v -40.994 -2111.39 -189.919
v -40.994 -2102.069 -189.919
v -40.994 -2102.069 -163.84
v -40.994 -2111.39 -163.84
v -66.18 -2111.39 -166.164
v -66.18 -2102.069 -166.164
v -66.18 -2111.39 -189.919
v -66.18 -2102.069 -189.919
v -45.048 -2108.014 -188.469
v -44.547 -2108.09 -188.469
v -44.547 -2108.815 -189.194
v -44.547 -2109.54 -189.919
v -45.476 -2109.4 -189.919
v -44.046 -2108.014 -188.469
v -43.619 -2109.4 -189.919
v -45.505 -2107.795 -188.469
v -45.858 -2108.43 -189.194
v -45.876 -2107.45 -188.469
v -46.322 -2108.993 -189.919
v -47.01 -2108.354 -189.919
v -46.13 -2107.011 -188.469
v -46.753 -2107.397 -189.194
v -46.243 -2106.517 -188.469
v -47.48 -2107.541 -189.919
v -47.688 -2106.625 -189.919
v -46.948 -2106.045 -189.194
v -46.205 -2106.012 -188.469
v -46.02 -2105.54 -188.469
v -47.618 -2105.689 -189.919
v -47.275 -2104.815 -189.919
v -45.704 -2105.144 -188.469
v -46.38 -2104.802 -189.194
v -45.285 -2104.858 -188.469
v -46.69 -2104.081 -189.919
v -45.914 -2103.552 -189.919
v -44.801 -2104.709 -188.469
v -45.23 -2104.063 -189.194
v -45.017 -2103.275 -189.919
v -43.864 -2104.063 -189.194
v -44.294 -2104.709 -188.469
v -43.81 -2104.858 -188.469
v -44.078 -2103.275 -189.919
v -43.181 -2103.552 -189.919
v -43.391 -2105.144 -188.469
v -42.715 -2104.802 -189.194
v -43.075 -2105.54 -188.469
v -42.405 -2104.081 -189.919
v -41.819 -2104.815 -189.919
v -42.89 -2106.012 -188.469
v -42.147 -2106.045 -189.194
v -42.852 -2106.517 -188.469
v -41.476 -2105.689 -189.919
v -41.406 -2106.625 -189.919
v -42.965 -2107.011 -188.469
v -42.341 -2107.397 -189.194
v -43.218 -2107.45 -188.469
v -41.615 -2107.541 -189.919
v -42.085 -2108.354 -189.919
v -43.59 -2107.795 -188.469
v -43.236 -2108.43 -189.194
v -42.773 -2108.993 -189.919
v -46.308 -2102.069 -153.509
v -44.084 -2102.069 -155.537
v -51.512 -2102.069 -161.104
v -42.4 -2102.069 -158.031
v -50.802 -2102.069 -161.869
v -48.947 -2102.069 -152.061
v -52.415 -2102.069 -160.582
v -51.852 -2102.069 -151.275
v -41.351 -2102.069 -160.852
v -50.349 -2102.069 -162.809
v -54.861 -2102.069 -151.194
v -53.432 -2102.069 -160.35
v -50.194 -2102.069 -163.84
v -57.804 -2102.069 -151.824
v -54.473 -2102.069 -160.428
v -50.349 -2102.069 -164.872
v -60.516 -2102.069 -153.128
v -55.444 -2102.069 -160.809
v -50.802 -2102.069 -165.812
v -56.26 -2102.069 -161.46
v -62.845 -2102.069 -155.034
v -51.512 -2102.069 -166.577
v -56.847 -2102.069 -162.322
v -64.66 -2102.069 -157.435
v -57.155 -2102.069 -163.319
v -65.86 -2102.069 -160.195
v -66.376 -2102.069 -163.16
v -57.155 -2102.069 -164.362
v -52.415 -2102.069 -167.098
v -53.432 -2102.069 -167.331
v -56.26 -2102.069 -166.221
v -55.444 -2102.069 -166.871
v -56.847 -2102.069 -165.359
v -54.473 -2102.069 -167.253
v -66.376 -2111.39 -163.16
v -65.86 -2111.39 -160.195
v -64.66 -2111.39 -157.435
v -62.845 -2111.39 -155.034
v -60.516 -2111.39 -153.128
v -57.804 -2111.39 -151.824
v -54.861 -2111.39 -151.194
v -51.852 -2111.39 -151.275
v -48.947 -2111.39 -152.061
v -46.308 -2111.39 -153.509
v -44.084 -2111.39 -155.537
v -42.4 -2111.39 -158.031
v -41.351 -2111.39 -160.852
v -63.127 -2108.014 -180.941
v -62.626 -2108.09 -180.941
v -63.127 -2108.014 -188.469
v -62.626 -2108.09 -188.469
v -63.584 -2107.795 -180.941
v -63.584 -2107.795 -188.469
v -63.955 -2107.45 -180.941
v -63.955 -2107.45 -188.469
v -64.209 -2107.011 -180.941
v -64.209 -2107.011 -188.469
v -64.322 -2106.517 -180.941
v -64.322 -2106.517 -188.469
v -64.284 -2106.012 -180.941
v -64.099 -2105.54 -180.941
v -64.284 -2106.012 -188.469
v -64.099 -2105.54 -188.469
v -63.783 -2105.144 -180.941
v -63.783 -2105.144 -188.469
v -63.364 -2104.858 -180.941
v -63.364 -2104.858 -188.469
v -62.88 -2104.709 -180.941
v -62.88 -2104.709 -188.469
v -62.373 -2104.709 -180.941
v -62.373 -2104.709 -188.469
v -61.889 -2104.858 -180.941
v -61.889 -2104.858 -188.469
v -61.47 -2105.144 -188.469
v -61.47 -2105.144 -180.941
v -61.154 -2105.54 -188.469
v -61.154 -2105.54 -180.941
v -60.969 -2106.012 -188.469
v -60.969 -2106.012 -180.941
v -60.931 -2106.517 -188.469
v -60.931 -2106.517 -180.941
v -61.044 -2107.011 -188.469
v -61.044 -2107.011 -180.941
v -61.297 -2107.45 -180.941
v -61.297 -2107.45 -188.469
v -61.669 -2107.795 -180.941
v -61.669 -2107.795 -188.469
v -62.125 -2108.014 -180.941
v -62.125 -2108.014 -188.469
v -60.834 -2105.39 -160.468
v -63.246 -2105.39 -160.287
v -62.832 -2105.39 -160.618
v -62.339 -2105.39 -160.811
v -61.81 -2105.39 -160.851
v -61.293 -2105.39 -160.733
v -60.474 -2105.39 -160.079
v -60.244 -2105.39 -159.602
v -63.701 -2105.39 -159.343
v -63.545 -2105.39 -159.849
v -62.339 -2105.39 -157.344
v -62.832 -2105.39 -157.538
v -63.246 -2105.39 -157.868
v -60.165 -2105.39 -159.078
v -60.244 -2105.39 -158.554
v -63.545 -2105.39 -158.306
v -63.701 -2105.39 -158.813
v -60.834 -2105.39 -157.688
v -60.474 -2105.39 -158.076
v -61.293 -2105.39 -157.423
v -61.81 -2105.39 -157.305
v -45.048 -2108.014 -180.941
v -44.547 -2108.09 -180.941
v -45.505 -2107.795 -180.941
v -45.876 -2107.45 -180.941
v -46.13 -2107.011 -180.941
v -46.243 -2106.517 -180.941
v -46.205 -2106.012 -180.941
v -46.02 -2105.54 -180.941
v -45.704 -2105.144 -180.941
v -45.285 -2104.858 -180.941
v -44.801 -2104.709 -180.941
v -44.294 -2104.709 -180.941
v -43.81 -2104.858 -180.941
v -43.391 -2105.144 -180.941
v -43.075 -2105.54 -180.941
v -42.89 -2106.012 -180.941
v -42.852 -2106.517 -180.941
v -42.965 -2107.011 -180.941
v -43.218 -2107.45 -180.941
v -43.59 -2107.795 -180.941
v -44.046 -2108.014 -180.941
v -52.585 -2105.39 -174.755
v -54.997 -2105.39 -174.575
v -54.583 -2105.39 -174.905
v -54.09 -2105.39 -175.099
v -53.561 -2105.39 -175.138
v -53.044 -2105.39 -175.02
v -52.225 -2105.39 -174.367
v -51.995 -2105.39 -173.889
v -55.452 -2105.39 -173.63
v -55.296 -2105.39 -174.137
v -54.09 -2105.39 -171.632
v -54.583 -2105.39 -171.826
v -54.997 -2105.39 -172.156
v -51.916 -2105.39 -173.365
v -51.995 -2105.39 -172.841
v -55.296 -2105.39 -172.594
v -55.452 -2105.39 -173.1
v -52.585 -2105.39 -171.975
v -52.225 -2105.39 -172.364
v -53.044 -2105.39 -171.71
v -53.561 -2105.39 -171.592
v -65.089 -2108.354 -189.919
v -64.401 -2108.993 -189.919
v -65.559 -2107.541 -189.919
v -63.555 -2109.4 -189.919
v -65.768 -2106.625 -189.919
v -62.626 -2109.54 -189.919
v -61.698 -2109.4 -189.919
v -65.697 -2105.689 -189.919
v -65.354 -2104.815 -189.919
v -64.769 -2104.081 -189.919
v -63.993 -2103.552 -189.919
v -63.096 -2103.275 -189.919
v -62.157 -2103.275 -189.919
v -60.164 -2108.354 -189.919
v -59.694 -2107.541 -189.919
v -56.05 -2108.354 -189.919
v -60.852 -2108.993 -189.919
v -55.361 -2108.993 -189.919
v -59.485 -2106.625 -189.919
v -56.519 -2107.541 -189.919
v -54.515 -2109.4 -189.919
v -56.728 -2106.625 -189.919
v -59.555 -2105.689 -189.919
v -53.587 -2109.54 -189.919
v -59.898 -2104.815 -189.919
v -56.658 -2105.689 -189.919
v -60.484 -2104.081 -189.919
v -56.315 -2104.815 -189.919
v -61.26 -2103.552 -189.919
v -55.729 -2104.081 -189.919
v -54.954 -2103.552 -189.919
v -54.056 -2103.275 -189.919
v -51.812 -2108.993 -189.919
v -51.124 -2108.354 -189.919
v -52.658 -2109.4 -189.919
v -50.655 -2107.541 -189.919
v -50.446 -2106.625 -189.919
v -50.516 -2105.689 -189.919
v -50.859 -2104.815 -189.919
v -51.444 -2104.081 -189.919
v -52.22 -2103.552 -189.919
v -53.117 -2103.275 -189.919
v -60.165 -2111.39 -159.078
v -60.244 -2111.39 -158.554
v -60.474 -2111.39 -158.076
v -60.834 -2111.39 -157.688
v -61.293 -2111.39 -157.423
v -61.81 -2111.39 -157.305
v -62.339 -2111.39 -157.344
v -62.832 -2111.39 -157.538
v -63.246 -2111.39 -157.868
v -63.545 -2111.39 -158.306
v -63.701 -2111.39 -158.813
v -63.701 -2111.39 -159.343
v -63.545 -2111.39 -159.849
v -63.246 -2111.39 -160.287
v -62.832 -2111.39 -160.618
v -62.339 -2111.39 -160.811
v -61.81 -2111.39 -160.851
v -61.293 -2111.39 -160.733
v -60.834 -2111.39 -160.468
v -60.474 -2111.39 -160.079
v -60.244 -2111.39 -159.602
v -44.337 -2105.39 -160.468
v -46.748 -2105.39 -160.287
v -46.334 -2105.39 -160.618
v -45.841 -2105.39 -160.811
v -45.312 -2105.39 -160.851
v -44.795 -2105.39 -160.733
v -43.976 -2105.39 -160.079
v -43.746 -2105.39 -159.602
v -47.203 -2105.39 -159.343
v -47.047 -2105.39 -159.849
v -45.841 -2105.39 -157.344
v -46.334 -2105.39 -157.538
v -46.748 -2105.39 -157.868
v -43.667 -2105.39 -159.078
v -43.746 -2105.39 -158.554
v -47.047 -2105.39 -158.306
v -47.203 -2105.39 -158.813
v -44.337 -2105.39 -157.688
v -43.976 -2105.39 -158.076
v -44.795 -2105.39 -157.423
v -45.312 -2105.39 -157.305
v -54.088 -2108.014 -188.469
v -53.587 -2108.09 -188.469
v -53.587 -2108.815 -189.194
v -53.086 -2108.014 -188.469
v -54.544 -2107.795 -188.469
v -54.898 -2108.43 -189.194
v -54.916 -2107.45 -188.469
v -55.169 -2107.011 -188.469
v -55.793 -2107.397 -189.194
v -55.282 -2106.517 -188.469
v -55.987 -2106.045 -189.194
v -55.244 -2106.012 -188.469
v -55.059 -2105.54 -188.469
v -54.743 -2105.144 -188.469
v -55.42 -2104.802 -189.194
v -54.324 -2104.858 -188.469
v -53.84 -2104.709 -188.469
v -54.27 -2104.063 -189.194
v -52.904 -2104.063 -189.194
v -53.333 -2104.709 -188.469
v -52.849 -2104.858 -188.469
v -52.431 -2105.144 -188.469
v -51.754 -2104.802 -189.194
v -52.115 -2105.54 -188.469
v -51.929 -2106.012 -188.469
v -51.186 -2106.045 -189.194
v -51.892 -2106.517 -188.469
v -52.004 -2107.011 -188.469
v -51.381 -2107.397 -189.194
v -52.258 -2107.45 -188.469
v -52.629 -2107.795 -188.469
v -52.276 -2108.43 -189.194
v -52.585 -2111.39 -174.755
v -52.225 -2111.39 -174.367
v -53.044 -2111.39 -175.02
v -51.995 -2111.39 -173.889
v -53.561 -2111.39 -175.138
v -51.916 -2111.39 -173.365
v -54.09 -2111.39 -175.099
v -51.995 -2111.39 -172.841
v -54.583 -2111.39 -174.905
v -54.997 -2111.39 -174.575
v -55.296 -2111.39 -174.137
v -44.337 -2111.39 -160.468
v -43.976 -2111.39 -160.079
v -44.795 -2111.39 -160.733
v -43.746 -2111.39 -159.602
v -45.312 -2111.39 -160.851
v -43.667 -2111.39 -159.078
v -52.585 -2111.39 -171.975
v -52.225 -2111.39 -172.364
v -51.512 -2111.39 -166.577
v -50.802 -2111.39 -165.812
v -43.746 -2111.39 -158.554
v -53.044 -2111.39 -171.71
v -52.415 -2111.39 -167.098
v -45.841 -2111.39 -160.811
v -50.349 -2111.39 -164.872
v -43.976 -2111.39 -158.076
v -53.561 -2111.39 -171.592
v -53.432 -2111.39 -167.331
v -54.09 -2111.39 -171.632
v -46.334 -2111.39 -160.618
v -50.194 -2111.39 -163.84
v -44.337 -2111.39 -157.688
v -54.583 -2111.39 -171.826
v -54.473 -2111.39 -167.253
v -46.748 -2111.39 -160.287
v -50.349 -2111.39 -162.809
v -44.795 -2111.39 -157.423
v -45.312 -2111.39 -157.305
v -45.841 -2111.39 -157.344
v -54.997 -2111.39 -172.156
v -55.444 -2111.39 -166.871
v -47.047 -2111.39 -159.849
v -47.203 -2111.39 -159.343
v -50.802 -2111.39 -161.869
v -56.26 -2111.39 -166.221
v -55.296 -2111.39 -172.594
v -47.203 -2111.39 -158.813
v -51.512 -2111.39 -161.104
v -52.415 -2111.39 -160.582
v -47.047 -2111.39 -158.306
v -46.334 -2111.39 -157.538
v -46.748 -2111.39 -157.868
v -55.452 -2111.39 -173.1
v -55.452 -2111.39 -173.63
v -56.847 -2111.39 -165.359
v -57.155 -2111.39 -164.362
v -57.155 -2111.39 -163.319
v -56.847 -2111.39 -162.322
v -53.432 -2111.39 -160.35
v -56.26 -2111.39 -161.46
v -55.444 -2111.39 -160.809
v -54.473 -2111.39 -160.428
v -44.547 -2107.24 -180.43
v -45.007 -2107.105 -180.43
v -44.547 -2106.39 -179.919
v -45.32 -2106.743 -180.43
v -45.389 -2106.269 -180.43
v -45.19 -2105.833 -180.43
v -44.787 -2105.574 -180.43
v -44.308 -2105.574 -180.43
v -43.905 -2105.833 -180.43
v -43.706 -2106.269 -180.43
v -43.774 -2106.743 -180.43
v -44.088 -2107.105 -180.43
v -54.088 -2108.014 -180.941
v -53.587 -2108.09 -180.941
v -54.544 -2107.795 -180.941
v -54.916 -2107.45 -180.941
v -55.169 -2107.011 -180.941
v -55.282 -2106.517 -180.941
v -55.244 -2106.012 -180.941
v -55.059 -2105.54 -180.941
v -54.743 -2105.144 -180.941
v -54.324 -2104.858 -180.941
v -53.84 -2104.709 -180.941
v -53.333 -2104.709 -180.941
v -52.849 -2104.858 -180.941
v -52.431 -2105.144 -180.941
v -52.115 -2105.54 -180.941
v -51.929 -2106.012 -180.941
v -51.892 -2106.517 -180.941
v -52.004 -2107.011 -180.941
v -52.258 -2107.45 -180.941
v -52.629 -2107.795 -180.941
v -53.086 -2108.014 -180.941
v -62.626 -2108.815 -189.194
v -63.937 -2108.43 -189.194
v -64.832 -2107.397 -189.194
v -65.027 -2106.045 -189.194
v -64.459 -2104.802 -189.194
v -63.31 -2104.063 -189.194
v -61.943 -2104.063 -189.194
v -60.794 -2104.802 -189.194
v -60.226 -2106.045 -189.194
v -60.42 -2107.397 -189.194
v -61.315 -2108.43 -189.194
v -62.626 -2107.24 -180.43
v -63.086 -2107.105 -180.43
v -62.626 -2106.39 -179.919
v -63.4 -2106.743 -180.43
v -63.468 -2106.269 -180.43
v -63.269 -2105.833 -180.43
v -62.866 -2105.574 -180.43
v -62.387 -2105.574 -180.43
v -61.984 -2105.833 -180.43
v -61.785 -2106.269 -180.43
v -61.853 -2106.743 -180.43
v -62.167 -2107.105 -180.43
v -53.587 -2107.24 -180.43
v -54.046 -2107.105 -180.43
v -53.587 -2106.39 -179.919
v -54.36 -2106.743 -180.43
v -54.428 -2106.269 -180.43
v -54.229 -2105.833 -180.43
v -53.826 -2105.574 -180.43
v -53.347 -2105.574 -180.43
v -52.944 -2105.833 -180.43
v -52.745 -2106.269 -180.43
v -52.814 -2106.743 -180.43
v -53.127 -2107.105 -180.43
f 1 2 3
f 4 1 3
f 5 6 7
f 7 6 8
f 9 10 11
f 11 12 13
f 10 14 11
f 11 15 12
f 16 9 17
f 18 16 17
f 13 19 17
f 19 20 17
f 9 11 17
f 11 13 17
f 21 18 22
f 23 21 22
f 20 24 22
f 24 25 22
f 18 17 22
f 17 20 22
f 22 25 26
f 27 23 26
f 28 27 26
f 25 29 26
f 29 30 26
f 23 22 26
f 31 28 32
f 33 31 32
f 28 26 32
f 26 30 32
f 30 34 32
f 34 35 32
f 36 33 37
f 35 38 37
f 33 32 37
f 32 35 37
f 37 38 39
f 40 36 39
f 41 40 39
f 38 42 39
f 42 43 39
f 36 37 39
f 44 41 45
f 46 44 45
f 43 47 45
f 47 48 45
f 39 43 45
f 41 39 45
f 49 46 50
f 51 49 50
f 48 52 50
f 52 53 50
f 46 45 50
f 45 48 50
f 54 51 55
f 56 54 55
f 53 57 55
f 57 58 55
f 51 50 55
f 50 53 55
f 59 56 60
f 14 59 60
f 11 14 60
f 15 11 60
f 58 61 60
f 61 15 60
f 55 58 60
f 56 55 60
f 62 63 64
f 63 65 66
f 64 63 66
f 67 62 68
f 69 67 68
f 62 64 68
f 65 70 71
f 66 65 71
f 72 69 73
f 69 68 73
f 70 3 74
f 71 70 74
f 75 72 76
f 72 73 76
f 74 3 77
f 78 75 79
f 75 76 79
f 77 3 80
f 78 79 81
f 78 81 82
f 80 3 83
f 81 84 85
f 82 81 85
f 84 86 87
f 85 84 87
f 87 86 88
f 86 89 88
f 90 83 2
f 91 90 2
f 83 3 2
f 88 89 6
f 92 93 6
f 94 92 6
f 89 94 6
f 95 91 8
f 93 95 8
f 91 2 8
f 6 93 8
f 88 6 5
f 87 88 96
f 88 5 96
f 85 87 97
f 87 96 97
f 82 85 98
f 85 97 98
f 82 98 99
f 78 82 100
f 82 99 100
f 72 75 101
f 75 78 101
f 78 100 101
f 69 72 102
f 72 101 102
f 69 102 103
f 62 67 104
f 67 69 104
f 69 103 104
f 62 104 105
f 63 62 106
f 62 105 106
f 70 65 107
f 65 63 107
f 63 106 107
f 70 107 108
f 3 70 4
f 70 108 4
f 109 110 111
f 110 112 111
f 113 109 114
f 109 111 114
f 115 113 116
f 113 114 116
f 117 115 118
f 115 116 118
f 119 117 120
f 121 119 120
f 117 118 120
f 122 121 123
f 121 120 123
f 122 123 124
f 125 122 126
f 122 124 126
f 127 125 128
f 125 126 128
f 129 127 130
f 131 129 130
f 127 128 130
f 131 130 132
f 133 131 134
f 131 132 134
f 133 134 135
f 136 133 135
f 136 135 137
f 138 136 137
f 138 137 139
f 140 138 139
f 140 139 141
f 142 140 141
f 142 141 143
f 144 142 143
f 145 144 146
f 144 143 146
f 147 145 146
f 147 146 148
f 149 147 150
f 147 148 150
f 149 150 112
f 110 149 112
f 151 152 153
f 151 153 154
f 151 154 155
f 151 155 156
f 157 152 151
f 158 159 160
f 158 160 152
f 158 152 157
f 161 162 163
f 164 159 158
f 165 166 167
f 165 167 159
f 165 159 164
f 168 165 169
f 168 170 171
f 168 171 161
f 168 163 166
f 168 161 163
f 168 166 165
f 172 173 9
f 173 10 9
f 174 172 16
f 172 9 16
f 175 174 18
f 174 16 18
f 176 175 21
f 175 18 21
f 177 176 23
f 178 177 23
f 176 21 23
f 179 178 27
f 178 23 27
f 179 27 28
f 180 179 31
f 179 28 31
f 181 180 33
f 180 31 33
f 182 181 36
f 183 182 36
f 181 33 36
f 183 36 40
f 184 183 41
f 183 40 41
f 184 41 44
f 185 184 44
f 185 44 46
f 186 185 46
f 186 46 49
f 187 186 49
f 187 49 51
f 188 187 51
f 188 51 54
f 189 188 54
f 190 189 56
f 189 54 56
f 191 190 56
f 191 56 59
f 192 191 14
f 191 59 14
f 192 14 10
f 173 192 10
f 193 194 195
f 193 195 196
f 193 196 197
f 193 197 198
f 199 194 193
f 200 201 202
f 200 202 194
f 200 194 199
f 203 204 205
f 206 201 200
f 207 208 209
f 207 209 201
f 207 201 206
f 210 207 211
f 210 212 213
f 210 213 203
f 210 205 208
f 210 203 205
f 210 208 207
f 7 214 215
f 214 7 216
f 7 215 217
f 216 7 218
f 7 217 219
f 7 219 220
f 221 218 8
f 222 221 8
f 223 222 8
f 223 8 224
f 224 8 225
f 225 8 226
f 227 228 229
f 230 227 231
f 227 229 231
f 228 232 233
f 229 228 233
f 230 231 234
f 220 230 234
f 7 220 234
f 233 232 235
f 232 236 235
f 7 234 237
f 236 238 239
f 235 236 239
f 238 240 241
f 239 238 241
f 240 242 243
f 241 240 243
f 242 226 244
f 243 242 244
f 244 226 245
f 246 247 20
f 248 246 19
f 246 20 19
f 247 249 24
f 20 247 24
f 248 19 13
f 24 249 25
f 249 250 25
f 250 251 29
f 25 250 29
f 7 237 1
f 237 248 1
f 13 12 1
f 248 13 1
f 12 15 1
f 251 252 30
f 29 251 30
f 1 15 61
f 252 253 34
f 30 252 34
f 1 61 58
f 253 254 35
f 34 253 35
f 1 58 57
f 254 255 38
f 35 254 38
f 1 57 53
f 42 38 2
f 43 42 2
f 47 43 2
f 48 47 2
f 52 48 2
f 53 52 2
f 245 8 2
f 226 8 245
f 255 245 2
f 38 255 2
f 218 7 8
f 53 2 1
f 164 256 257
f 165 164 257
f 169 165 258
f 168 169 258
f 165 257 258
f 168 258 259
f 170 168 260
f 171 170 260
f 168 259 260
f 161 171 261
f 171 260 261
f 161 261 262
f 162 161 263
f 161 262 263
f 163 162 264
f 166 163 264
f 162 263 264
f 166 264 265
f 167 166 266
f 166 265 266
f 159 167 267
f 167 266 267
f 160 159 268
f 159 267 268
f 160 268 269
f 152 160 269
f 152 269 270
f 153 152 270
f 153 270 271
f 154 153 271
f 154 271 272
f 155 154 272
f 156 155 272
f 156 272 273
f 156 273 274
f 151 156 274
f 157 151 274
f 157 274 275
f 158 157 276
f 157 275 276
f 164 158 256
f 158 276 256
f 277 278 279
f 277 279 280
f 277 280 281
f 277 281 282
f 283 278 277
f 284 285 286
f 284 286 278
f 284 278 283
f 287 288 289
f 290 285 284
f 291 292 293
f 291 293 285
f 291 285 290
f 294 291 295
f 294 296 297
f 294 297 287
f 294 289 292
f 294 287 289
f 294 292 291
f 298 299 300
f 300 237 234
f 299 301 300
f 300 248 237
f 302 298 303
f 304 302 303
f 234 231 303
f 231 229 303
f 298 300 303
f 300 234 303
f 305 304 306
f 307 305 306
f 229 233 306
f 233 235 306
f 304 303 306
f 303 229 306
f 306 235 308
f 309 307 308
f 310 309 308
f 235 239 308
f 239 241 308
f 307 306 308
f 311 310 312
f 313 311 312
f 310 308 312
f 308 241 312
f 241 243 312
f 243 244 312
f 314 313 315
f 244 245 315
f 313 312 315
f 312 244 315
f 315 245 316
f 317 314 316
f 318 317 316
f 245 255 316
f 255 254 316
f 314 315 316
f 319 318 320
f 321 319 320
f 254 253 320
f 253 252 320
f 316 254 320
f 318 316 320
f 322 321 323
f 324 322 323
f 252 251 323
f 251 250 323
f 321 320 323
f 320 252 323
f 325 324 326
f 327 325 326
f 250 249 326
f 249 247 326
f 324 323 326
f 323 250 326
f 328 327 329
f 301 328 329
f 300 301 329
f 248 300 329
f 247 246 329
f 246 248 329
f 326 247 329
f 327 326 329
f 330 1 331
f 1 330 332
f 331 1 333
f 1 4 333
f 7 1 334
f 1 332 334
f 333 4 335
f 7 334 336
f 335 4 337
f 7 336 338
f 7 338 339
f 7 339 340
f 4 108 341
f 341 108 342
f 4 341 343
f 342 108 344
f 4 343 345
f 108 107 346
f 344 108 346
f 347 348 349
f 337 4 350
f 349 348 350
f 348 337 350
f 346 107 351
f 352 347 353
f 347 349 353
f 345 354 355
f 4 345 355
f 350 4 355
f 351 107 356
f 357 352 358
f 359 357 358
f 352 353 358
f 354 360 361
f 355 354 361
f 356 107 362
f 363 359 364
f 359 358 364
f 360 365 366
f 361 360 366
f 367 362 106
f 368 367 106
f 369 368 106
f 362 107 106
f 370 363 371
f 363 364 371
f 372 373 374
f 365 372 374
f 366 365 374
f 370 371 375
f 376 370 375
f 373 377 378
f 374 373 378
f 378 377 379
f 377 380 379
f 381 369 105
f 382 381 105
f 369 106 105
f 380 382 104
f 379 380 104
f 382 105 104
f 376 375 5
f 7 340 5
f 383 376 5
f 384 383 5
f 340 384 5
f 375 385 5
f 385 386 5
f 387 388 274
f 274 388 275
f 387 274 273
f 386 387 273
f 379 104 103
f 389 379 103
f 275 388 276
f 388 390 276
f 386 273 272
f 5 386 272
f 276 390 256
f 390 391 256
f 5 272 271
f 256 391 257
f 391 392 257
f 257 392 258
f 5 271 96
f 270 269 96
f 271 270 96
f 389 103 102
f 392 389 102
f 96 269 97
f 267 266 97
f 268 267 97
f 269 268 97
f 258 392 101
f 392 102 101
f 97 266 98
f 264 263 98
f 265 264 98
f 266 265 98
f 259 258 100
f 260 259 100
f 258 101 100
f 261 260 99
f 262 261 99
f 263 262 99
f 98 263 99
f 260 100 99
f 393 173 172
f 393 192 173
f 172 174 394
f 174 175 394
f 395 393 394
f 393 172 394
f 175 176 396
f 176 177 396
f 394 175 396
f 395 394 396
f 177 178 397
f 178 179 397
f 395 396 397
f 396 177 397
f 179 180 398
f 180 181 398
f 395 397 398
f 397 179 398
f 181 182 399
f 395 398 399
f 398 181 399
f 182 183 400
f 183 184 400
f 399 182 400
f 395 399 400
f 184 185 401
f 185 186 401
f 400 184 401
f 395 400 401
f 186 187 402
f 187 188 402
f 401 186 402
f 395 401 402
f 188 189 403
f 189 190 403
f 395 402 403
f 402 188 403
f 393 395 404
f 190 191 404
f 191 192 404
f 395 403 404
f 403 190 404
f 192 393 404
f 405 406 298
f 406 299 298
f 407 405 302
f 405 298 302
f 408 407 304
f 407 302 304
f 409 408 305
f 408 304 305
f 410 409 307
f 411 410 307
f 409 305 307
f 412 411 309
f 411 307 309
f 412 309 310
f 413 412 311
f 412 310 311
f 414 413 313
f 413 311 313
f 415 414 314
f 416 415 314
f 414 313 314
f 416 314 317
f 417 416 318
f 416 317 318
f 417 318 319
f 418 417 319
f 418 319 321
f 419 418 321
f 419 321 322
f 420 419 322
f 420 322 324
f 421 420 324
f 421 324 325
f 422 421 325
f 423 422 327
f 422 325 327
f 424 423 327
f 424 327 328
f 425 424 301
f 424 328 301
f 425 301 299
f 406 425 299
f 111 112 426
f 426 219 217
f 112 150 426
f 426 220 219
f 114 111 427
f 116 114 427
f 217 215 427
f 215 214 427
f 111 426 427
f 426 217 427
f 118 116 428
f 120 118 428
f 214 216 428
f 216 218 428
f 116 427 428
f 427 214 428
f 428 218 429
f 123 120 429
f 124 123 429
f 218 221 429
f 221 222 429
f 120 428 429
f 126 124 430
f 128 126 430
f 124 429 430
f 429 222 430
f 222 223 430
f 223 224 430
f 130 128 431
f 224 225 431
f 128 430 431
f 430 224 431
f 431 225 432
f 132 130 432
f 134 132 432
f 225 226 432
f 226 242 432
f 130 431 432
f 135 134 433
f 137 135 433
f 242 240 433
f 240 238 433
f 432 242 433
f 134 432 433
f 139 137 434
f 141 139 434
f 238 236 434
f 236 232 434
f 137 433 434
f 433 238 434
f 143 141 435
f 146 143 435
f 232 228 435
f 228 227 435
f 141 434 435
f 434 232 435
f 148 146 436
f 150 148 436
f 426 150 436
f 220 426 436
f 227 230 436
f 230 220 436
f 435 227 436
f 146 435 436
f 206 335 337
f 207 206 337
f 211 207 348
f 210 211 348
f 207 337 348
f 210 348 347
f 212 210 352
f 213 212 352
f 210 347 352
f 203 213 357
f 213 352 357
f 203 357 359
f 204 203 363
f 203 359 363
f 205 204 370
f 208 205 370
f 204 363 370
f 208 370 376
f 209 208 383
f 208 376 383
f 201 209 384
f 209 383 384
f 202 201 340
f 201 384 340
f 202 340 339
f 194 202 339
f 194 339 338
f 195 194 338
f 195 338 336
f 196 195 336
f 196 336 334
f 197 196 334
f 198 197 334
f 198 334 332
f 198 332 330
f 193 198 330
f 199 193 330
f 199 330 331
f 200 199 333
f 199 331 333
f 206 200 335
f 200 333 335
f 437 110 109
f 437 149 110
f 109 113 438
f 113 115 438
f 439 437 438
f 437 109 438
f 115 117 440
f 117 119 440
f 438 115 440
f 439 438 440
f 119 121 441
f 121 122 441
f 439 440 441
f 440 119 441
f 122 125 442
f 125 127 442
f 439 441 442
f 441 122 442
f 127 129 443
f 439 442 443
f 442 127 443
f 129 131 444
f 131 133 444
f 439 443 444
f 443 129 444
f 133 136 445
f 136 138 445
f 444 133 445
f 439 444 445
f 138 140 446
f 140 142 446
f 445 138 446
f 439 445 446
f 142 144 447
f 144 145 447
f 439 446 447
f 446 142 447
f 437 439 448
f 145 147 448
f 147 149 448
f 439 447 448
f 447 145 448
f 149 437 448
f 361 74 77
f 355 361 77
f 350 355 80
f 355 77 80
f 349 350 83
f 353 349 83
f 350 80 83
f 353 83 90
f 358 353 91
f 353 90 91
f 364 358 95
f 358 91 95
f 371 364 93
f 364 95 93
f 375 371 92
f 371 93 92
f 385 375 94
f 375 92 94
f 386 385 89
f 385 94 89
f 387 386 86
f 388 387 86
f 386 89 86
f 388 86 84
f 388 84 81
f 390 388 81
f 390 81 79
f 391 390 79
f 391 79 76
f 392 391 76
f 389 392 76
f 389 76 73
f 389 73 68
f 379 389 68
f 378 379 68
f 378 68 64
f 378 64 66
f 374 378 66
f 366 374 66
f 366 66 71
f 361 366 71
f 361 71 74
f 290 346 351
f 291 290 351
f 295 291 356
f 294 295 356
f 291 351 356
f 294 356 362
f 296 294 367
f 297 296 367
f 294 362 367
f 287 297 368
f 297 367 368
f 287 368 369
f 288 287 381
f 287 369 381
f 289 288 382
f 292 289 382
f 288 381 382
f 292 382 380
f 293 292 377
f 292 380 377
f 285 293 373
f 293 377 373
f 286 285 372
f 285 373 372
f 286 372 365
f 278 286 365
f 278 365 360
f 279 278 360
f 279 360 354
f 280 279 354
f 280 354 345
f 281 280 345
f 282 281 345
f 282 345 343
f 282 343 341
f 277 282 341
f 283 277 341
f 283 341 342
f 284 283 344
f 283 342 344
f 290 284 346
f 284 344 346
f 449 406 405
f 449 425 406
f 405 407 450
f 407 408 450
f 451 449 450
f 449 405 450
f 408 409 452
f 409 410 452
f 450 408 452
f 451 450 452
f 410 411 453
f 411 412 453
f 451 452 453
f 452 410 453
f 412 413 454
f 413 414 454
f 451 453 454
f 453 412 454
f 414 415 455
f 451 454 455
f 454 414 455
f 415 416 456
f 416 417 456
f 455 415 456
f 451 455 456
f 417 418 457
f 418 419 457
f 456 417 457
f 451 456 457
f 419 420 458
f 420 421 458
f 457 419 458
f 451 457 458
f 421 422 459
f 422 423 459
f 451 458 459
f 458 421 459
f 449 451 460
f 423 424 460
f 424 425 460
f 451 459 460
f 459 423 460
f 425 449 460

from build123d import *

# Parameters (mm, degrees)
SKETCH2_R                                      = 12.7
BOSS_EXTRUDE6_DEPTH                            = 40.64
SKETCH3_R                                      = 3.5
CUT_EXTRUDE1_DEPTH                             = 40.64
SKETCH4_R                                      = 1.778
CUT_EXTRUDE2_DEPTH                             = 6
BOSS_EXTRUDE8_DEPTH                            = 10
SKETCH8_W                                      = 25.185693912
SKETCH8_H                                      = 10
BOSS_EXTRUDE9_DEPTH                            = 7.284789
BOSS_EXTRUDE10_DEPTH                           = 30.64
CSK_FOR_M3_FLAT_HEAD_MACHINE_SCREW1_AT_2_COUNT = 2
CSK_FOR_M3_FLAT_HEAD_MACHINE_SCREW1_AT_2_PITCH = 9.039543014
CSK_FOR_M3_FLAT_HEAD_MACHINE_SCREW1_AT_3_COUNT = 2
CSK_FOR_M3_FLAT_HEAD_MACHINE_SCREW1_AT_3_PITCH = 9.039543014
SKETCH25_W                                     = 26.719153215
SKETCH25_H                                     = 31.319175306
CUT_EXTRUDE9_DEPTH                             = 39.778747573


with BuildPart() as part:
    # Sketch2 → Boss-Extrude6 (new body)
    with BuildSketch(Plane(origin=(0, -2111.389926236, 0), x_dir=(1, 0, 0), z_dir=(0, 1, 0))):
        with Locations((-53.693967541, 163.840329354)):
            Circle(SKETCH2_R)
    extrude(amount=BOSS_EXTRUDE6_DEPTH)

    # Sketch3 → Cut-Extrude1 (cut)
    with BuildSketch(Plane(origin=(0, -2070.749926236, 0), x_dir=(1, 0, 0), z_dir=(0, 1, 0))):
        with Locations((-53.693967541, 163.840329354)):
            Circle(SKETCH3_R)
    extrude(amount=-CUT_EXTRUDE1_DEPTH, mode=Mode.SUBTRACT)

    # Sketch4 → Cut-Extrude2 (cut)
    with BuildSketch(Plane.XZ.offset(2111.389926236)):
        with Locations((-61.942859512, -159.077829354)):
            Circle(SKETCH4_R)
        with Locations((-53.693967541, -173.365329354)):
            Circle(SKETCH4_R)
        with Locations((-45.44507557, -159.077829354)):
            Circle(SKETCH4_R)
    extrude(amount=-CUT_EXTRUDE2_DEPTH, mode=Mode.SUBTRACT)

    # Sketch7 → Boss-Extrude8 (add)
    with BuildSketch(Plane.XZ.offset(2111.389926236)):
        with BuildLine():
            Line((-40.993967541, -163.840329354), (-40.993967541, -182.634287878))
            Line((-40.993967541, -182.634287878), (-66.179661453, -182.634287878))
            Line((-66.179661453, -182.634287878), (-66.179661453, -166.163570095))
            ThreePointArc((-66.179661453, -166.163570095), (-52.527415502, -176.486639343), (-40.993967541, -163.840329354))
        make_face()
    extrude(amount=-BOSS_EXTRUDE8_DEPTH)

    # Sketch8 → Boss-Extrude9 (add)
    with BuildSketch(Plane(origin=(0, 0, -182.634287878), x_dir=(-1, 0, 0), z_dir=(0, 0, -1))):
        with Locations((53.586814497, -2106.389926236)):
            Rectangle(SKETCH8_W, SKETCH8_H)
    extrude(amount=BOSS_EXTRUDE9_DEPTH)

    # Sketch9 → Boss-Extrude10 (add)
    with BuildSketch(Plane(origin=(0, -2070.749926236, 0), x_dir=(1, 0, 0), z_dir=(0, 1, 0))):
        with BuildLine():
            Line((-66.179661453, 163.840329354), (-66.179661453, 189.919076927))
            Line((-66.179661453, 189.919076927), (-40.993967541, 189.919076927))
            Line((-40.993967541, 189.919076927), (-40.993967541, 163.840329354))
            ThreePointArc((-40.993967541, 163.840329354), (-53.586814497, 176.43317631), (-66.179661453, 163.840329354))
        make_face()
    extrude(amount=-BOSS_EXTRUDE10_DEPTH)

    # Sketch15 → CSK for M3 Flat Head Machine Screw1 (revolve, cut)
    with BuildSketch(Plane(origin=(-53.586814498, -2075.749926236, -189.919076927), x_dir=(0, 1, 0), z_dir=(1, 0, 0))):
        Polygon((0, 0), (0, 10), (1.7, 8.978536948), (1.7, 1.45), (3.15, 0), align=None)
    csk_for_m3_flat_head_machine_screw1 = revolve(axis=Axis((-53.586814498, -2075.749926236, -196.269076927), (0, 0, 1)), mode=Mode.SUBTRACT)

    # CSK for M3 Flat Head Machine Screw1 at 2: CSK for M3 Flat Head Machine Screw1 ×2
    with Locations(*[(-i * CSK_FOR_M3_FLAT_HEAD_MACHINE_SCREW1_AT_2_PITCH, 0, 0) for i in range(1, CSK_FOR_M3_FLAT_HEAD_MACHINE_SCREW1_AT_2_COUNT)]):
        add(csk_for_m3_flat_head_machine_screw1, mode=Mode.SUBTRACT)

    # CSK for M3 Flat Head Machine Screw1 at 3: CSK for M3 Flat Head Machine Screw1 ×2
    with Locations(*[(i * CSK_FOR_M3_FLAT_HEAD_MACHINE_SCREW1_AT_3_PITCH, 0, 0) for i in range(1, CSK_FOR_M3_FLAT_HEAD_MACHINE_SCREW1_AT_3_COUNT)]):
        add(csk_for_m3_flat_head_machine_screw1, mode=Mode.SUBTRACT)

    # Mirror1: CSK for M3 Flat Head Machine Screw1 across plane
    add(csk_for_m3_flat_head_machine_screw1.mirror(Plane.ZX.offset(-2091.069926234)), mode=Mode.SUBTRACT)

    # Mirror1 copy 1 sketch → Mirror1 copy 1 (revolve, cut)
    with BuildSketch(Plane(origin=(-62.626357512, -2106.389926232, -189.919076927), x_dir=(0, -1, 0), z_dir=(1, 0, 0))):
        Polygon((0, 0), (0, -10), (1.7, -8.978536948), (1.7, -1.45), (3.15, 0), align=None)
    revolve(axis=Axis((-62.626357512, -2106.389926232, -196.269076927), (0, 0, -1)), mode=Mode.SUBTRACT)

    # Mirror1 copy 2 sketch → Mirror1 copy 2 (revolve, cut)
    with BuildSketch(Plane(origin=(-44.547271484, -2106.389926232, -189.919076927), x_dir=(0, -1, 0), z_dir=(1, 0, 0))):
        Polygon((0, 0), (0, -10), (1.7, -8.978536948), (1.7, -1.45), (3.15, 0), align=None)
    revolve(axis=Axis((-44.547271484, -2106.389926232, -196.269076927), (0, 0, -1)), mode=Mode.SUBTRACT)

    # Sketch25 → Cut-Extrude9 (cut, through all)
    with BuildSketch(Plane(origin=(0, 0, -189.919076927), x_dir=(-1, 0, 0), z_dir=(0, 0, -1))):
        with Locations((54.353544149, -2086.409513889)):
            Rectangle(SKETCH25_W, SKETCH25_H)
    extrude(amount=-CUT_EXTRUDE9_DEPTH, mode=Mode.SUBTRACT)


solid = part.part
